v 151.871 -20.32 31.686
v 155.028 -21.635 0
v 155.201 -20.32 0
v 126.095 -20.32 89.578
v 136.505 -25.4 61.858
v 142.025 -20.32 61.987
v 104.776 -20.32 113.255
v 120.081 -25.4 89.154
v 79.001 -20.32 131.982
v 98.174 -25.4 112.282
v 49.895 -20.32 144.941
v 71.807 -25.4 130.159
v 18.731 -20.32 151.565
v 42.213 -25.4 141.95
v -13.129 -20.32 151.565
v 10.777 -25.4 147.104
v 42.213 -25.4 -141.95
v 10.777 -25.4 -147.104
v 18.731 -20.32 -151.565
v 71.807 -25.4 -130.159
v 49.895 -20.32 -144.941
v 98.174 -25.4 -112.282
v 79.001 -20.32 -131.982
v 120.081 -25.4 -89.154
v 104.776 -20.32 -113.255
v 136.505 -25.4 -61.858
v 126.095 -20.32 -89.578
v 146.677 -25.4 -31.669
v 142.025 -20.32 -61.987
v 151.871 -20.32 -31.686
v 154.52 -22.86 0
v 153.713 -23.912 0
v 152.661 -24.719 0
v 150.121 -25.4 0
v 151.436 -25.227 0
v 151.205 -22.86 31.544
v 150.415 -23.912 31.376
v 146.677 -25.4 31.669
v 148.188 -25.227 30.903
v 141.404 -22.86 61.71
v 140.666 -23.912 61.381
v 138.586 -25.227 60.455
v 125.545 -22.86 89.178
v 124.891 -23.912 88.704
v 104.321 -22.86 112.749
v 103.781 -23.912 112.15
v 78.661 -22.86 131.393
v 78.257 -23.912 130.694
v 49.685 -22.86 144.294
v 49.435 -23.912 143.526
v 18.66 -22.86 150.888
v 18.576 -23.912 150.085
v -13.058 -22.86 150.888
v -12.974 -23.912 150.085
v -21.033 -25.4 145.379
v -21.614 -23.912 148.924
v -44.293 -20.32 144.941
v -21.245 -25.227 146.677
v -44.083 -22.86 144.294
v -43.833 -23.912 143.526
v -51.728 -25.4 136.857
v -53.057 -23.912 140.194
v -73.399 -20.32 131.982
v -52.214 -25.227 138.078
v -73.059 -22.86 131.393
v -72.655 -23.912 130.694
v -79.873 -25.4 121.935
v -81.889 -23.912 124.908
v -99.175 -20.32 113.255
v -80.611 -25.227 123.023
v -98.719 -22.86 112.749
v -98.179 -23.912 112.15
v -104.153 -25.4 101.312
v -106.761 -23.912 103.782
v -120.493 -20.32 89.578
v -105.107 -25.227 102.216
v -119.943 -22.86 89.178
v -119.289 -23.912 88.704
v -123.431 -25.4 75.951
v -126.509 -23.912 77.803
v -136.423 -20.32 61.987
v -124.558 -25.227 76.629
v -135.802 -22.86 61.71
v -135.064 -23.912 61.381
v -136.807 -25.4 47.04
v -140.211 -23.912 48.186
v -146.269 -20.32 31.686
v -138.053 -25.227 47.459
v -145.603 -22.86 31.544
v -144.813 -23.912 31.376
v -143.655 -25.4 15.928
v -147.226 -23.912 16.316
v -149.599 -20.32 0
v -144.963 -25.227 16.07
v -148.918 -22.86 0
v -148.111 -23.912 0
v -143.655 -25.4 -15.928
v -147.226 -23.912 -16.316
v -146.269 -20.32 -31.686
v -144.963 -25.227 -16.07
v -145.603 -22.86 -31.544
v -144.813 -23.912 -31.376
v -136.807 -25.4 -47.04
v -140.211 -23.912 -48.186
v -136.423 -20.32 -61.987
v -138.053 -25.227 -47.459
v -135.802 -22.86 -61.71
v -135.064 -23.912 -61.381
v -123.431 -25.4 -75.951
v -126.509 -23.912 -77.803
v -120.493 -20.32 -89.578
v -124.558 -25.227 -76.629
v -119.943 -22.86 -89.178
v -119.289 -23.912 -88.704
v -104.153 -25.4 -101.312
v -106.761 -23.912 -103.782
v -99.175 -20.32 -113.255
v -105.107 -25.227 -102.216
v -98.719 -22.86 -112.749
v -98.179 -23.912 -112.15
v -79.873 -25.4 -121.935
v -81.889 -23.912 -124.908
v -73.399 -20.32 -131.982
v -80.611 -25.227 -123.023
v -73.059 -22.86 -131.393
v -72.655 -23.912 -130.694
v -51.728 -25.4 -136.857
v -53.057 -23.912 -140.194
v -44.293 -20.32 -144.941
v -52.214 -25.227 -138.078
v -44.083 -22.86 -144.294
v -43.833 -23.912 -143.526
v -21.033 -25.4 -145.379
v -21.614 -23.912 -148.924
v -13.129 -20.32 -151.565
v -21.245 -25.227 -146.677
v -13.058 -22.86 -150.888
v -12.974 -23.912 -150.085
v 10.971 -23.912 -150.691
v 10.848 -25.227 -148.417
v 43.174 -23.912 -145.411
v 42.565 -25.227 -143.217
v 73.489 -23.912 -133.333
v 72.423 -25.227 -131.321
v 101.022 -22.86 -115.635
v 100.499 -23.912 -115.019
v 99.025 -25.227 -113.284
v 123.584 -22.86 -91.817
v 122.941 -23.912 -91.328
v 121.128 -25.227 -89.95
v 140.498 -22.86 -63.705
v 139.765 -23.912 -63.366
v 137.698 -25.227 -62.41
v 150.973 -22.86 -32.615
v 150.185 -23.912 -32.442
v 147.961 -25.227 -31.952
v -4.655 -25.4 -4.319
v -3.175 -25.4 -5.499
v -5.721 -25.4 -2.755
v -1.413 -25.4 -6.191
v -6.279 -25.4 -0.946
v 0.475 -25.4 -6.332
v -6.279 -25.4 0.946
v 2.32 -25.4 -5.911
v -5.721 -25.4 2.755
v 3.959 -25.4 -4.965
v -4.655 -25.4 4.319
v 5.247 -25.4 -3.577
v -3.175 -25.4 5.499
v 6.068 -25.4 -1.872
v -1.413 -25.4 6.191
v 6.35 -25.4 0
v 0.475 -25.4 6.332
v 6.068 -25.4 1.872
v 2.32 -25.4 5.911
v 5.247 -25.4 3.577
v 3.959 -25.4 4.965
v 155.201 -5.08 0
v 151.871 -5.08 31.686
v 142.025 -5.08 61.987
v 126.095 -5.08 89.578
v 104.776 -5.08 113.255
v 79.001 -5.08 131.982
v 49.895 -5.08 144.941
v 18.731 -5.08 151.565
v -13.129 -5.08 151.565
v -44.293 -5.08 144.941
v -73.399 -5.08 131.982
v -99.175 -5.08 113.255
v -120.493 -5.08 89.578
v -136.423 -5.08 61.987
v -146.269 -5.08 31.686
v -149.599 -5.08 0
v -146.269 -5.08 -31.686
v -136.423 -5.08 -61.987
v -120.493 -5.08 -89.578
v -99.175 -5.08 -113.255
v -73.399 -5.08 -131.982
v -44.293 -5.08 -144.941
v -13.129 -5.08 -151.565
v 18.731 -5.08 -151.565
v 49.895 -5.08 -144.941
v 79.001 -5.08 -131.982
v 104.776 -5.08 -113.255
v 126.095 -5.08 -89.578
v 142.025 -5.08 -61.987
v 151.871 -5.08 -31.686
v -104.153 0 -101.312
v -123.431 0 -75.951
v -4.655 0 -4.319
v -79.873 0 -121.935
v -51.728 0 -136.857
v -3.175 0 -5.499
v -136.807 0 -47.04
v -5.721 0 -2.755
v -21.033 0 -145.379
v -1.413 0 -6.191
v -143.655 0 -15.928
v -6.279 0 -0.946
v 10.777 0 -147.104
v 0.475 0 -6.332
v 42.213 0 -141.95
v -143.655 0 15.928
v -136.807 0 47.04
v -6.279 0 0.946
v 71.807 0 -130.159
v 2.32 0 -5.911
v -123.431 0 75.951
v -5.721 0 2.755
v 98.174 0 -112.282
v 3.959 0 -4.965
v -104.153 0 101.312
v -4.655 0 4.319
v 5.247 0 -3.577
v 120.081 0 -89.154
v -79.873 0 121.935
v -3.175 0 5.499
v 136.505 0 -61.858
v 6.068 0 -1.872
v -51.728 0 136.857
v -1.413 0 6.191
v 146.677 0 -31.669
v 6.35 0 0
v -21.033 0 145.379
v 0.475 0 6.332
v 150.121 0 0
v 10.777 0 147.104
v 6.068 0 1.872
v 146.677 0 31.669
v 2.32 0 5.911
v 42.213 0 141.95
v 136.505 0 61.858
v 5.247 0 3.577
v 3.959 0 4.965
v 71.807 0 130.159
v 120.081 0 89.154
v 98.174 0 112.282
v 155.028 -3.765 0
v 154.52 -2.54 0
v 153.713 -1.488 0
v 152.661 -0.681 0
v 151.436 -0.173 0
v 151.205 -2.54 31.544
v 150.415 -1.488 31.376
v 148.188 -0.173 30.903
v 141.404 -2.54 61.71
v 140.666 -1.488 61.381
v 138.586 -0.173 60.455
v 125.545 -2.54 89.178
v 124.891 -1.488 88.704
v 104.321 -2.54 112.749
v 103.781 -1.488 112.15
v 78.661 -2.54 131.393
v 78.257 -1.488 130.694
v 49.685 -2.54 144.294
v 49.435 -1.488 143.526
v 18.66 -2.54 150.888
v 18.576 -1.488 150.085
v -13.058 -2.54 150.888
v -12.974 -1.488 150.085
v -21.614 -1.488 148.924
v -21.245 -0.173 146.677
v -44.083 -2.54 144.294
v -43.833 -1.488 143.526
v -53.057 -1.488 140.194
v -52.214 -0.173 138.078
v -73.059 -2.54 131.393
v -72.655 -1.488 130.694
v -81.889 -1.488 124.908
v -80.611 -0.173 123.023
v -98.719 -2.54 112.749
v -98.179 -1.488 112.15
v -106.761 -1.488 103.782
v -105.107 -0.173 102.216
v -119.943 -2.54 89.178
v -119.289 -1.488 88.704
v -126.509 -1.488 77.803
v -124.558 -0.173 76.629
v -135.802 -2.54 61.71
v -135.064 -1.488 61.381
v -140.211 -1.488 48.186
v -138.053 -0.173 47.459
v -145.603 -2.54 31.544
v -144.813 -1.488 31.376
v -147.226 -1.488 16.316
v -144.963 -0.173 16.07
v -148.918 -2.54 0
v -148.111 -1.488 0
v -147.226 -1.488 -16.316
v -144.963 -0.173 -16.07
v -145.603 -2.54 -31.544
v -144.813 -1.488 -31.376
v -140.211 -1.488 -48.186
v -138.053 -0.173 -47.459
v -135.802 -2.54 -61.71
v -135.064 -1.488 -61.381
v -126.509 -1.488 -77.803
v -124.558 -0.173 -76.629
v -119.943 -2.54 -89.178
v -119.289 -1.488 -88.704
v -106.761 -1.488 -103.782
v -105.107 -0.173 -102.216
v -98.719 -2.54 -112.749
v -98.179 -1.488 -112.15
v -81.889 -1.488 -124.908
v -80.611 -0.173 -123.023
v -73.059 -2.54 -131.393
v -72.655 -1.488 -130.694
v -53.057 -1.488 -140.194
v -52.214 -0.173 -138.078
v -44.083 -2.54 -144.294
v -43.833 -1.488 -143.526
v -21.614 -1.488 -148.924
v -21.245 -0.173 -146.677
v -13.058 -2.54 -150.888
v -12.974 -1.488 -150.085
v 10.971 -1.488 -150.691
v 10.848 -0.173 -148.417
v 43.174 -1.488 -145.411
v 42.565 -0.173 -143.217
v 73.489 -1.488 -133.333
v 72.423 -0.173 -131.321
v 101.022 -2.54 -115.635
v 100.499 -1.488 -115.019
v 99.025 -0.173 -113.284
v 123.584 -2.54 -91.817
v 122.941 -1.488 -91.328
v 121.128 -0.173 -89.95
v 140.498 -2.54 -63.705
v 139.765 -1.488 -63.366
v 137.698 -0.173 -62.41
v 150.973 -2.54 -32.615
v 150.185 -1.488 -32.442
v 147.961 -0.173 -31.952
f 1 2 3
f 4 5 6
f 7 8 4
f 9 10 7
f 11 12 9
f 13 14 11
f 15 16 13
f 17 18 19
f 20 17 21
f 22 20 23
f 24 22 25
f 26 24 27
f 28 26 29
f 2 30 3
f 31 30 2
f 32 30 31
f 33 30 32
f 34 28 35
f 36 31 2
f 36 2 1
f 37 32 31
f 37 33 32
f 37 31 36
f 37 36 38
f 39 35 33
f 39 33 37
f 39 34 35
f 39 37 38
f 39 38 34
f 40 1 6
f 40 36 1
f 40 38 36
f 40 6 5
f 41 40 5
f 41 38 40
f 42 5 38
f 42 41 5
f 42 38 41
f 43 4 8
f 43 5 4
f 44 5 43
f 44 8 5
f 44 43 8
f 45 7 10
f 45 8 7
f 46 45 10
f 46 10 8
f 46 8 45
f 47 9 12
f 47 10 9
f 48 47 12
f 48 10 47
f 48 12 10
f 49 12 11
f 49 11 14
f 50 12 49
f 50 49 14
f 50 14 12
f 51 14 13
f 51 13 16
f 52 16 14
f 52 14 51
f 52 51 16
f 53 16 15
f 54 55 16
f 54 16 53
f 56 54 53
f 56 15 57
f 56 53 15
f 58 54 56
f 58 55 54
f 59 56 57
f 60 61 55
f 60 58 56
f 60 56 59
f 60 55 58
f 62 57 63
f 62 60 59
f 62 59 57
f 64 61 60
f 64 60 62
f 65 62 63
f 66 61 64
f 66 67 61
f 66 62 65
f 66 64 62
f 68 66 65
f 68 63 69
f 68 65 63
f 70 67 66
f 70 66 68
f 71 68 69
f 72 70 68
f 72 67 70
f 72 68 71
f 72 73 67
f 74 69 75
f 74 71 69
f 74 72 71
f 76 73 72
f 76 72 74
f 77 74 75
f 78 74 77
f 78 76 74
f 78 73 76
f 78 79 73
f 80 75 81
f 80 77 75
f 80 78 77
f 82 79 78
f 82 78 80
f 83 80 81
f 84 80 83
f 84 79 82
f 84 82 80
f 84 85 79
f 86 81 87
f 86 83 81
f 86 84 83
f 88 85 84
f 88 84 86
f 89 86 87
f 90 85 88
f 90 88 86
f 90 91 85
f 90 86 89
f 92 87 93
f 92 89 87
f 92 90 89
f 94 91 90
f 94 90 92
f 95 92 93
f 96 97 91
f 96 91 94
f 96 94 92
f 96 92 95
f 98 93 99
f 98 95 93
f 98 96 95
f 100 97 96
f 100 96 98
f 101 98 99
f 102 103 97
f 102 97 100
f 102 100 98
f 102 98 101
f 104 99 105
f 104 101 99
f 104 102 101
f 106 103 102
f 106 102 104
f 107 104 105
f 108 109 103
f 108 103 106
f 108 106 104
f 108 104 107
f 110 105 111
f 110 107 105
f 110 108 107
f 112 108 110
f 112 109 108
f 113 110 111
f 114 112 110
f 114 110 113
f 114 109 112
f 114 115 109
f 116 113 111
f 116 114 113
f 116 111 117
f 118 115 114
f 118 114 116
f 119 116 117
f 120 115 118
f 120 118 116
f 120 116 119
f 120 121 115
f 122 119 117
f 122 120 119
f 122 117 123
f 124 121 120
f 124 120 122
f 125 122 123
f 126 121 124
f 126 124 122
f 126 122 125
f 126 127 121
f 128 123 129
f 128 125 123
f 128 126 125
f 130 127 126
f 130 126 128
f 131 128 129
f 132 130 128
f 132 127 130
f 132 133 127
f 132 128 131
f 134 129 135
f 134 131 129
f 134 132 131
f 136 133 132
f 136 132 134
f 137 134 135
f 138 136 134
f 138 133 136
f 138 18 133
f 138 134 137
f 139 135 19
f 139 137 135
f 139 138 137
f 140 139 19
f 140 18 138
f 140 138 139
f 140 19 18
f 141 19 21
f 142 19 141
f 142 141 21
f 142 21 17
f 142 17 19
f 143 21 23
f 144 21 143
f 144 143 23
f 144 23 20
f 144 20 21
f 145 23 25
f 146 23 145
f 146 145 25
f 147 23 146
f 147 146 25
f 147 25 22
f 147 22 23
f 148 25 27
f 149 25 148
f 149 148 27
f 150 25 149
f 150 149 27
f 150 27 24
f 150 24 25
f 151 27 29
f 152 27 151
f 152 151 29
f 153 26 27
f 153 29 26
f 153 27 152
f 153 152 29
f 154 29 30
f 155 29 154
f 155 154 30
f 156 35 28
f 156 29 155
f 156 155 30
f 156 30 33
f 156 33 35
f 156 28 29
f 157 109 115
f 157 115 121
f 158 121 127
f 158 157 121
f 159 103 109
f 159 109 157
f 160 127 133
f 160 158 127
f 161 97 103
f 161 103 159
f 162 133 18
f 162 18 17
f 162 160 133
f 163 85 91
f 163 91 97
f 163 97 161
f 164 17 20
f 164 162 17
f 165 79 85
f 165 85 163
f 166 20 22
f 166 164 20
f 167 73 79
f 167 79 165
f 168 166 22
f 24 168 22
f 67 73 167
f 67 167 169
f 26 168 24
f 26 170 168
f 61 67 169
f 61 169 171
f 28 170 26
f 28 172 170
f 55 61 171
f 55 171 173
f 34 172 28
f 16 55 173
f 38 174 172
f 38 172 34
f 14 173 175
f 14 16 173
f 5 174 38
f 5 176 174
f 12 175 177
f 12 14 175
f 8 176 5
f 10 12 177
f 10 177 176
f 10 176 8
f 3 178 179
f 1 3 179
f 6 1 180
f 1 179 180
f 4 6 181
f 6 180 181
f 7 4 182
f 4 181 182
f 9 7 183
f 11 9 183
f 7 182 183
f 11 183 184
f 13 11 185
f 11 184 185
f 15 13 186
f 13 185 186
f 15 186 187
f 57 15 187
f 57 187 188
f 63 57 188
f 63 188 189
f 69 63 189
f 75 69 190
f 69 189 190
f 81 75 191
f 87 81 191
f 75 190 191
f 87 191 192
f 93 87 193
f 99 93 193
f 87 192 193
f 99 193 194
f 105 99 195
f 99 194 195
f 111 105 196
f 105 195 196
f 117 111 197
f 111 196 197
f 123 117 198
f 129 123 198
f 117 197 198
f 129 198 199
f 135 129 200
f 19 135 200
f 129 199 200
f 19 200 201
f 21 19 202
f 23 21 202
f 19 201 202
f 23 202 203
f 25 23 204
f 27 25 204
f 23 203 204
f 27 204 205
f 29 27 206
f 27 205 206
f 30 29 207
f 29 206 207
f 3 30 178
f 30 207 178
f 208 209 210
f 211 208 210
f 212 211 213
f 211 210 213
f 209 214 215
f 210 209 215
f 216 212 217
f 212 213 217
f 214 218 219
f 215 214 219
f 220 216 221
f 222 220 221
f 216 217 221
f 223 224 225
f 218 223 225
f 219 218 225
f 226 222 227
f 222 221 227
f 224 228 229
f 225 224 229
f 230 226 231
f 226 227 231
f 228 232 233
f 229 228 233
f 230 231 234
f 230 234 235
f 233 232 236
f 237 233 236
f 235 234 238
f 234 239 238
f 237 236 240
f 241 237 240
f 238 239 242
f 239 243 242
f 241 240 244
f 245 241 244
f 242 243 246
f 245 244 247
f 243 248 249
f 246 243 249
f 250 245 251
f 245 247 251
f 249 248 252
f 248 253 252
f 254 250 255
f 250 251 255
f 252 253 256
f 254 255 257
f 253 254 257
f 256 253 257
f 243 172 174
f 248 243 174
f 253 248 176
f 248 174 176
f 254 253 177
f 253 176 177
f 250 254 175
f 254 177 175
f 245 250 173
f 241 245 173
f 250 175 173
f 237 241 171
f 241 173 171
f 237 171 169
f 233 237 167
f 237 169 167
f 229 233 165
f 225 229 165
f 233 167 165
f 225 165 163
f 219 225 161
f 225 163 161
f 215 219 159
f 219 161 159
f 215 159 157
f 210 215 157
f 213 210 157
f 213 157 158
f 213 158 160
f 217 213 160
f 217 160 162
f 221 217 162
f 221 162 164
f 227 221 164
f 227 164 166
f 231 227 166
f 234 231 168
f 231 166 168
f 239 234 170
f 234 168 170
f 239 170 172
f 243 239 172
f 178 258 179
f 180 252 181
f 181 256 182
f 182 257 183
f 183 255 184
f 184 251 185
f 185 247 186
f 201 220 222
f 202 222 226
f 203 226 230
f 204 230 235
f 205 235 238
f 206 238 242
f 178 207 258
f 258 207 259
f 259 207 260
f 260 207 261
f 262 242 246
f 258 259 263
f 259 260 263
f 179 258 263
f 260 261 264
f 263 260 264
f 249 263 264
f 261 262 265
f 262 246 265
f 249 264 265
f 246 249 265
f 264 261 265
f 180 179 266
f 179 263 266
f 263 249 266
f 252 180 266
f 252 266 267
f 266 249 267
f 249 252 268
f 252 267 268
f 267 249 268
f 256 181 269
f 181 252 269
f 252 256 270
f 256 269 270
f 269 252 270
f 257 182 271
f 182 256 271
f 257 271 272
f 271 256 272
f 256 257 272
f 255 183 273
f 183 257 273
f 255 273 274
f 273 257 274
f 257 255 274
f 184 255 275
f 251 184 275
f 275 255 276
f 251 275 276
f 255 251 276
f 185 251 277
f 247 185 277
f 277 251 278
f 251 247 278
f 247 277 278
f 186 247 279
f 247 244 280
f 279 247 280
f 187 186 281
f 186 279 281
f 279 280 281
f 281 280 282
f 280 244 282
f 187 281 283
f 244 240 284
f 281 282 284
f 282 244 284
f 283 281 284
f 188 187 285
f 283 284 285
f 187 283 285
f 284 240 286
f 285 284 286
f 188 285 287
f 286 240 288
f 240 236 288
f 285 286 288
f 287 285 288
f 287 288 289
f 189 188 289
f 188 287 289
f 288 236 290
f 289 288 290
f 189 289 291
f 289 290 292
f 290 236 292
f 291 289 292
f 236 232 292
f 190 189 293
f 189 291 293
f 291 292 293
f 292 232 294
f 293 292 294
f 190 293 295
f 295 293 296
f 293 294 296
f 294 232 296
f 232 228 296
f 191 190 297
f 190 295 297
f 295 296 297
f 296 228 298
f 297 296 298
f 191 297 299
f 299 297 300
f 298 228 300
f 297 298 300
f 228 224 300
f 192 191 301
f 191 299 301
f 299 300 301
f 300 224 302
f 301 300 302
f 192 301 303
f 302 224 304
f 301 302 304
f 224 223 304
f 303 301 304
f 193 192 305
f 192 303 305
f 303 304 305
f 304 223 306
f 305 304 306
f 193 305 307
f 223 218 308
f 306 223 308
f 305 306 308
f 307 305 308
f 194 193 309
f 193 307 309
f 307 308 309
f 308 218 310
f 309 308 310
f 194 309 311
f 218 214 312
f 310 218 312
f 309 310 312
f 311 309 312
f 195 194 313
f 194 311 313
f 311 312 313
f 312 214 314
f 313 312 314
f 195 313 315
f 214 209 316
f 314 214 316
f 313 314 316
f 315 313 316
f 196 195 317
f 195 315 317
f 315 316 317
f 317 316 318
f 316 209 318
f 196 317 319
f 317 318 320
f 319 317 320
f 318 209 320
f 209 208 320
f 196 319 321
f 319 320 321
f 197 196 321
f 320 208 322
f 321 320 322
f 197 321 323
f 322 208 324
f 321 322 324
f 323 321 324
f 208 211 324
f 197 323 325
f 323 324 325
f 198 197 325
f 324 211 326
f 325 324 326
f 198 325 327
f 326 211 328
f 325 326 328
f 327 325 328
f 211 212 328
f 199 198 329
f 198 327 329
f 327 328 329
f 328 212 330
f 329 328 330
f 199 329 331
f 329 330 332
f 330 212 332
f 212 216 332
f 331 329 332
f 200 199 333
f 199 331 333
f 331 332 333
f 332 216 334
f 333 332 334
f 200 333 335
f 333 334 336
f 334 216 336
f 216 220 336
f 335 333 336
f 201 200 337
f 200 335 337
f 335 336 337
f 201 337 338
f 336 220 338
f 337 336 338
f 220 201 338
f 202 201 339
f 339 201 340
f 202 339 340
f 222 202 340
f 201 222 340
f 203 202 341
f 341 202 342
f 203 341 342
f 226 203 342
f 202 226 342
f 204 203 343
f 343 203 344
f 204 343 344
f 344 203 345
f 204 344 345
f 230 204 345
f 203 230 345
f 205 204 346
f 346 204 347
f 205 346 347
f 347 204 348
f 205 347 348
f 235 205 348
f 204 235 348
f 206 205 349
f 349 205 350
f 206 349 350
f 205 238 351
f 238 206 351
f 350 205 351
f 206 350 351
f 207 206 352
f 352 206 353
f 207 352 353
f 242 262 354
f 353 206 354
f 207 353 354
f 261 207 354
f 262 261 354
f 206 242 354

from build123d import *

# Parameters (mm, degrees)
F0_R     = 152.4
F1_DEPTH = 25.4
F2_R     = 5.08
F3_R     = 6.35
F4_DEPTH = 25.4


with BuildPart() as f1:
    # F0 (on Front) → F1 (new body)
    with BuildSketch(Plane.XZ):
        with Locations((2.800982, 0)):
            Circle(F0_R)
    extrude(amount=F1_DEPTH)

    # F2
    f2_edges = [f1.edges().sort_by_distance(p)[0] for p in [
        (-149.599018, -25.4, 0),
        (-149.599018, 0, 0),
    ]]
    fillet(f2_edges, radius=F2_R)

    # F3 (on face) → F4 (cut)
    with BuildSketch(Plane.XZ.offset(25.4)):
        Circle(F3_R)
    extrude(amount=-F4_DEPTH, mode=Mode.SUBTRACT)


solid = f1.part
